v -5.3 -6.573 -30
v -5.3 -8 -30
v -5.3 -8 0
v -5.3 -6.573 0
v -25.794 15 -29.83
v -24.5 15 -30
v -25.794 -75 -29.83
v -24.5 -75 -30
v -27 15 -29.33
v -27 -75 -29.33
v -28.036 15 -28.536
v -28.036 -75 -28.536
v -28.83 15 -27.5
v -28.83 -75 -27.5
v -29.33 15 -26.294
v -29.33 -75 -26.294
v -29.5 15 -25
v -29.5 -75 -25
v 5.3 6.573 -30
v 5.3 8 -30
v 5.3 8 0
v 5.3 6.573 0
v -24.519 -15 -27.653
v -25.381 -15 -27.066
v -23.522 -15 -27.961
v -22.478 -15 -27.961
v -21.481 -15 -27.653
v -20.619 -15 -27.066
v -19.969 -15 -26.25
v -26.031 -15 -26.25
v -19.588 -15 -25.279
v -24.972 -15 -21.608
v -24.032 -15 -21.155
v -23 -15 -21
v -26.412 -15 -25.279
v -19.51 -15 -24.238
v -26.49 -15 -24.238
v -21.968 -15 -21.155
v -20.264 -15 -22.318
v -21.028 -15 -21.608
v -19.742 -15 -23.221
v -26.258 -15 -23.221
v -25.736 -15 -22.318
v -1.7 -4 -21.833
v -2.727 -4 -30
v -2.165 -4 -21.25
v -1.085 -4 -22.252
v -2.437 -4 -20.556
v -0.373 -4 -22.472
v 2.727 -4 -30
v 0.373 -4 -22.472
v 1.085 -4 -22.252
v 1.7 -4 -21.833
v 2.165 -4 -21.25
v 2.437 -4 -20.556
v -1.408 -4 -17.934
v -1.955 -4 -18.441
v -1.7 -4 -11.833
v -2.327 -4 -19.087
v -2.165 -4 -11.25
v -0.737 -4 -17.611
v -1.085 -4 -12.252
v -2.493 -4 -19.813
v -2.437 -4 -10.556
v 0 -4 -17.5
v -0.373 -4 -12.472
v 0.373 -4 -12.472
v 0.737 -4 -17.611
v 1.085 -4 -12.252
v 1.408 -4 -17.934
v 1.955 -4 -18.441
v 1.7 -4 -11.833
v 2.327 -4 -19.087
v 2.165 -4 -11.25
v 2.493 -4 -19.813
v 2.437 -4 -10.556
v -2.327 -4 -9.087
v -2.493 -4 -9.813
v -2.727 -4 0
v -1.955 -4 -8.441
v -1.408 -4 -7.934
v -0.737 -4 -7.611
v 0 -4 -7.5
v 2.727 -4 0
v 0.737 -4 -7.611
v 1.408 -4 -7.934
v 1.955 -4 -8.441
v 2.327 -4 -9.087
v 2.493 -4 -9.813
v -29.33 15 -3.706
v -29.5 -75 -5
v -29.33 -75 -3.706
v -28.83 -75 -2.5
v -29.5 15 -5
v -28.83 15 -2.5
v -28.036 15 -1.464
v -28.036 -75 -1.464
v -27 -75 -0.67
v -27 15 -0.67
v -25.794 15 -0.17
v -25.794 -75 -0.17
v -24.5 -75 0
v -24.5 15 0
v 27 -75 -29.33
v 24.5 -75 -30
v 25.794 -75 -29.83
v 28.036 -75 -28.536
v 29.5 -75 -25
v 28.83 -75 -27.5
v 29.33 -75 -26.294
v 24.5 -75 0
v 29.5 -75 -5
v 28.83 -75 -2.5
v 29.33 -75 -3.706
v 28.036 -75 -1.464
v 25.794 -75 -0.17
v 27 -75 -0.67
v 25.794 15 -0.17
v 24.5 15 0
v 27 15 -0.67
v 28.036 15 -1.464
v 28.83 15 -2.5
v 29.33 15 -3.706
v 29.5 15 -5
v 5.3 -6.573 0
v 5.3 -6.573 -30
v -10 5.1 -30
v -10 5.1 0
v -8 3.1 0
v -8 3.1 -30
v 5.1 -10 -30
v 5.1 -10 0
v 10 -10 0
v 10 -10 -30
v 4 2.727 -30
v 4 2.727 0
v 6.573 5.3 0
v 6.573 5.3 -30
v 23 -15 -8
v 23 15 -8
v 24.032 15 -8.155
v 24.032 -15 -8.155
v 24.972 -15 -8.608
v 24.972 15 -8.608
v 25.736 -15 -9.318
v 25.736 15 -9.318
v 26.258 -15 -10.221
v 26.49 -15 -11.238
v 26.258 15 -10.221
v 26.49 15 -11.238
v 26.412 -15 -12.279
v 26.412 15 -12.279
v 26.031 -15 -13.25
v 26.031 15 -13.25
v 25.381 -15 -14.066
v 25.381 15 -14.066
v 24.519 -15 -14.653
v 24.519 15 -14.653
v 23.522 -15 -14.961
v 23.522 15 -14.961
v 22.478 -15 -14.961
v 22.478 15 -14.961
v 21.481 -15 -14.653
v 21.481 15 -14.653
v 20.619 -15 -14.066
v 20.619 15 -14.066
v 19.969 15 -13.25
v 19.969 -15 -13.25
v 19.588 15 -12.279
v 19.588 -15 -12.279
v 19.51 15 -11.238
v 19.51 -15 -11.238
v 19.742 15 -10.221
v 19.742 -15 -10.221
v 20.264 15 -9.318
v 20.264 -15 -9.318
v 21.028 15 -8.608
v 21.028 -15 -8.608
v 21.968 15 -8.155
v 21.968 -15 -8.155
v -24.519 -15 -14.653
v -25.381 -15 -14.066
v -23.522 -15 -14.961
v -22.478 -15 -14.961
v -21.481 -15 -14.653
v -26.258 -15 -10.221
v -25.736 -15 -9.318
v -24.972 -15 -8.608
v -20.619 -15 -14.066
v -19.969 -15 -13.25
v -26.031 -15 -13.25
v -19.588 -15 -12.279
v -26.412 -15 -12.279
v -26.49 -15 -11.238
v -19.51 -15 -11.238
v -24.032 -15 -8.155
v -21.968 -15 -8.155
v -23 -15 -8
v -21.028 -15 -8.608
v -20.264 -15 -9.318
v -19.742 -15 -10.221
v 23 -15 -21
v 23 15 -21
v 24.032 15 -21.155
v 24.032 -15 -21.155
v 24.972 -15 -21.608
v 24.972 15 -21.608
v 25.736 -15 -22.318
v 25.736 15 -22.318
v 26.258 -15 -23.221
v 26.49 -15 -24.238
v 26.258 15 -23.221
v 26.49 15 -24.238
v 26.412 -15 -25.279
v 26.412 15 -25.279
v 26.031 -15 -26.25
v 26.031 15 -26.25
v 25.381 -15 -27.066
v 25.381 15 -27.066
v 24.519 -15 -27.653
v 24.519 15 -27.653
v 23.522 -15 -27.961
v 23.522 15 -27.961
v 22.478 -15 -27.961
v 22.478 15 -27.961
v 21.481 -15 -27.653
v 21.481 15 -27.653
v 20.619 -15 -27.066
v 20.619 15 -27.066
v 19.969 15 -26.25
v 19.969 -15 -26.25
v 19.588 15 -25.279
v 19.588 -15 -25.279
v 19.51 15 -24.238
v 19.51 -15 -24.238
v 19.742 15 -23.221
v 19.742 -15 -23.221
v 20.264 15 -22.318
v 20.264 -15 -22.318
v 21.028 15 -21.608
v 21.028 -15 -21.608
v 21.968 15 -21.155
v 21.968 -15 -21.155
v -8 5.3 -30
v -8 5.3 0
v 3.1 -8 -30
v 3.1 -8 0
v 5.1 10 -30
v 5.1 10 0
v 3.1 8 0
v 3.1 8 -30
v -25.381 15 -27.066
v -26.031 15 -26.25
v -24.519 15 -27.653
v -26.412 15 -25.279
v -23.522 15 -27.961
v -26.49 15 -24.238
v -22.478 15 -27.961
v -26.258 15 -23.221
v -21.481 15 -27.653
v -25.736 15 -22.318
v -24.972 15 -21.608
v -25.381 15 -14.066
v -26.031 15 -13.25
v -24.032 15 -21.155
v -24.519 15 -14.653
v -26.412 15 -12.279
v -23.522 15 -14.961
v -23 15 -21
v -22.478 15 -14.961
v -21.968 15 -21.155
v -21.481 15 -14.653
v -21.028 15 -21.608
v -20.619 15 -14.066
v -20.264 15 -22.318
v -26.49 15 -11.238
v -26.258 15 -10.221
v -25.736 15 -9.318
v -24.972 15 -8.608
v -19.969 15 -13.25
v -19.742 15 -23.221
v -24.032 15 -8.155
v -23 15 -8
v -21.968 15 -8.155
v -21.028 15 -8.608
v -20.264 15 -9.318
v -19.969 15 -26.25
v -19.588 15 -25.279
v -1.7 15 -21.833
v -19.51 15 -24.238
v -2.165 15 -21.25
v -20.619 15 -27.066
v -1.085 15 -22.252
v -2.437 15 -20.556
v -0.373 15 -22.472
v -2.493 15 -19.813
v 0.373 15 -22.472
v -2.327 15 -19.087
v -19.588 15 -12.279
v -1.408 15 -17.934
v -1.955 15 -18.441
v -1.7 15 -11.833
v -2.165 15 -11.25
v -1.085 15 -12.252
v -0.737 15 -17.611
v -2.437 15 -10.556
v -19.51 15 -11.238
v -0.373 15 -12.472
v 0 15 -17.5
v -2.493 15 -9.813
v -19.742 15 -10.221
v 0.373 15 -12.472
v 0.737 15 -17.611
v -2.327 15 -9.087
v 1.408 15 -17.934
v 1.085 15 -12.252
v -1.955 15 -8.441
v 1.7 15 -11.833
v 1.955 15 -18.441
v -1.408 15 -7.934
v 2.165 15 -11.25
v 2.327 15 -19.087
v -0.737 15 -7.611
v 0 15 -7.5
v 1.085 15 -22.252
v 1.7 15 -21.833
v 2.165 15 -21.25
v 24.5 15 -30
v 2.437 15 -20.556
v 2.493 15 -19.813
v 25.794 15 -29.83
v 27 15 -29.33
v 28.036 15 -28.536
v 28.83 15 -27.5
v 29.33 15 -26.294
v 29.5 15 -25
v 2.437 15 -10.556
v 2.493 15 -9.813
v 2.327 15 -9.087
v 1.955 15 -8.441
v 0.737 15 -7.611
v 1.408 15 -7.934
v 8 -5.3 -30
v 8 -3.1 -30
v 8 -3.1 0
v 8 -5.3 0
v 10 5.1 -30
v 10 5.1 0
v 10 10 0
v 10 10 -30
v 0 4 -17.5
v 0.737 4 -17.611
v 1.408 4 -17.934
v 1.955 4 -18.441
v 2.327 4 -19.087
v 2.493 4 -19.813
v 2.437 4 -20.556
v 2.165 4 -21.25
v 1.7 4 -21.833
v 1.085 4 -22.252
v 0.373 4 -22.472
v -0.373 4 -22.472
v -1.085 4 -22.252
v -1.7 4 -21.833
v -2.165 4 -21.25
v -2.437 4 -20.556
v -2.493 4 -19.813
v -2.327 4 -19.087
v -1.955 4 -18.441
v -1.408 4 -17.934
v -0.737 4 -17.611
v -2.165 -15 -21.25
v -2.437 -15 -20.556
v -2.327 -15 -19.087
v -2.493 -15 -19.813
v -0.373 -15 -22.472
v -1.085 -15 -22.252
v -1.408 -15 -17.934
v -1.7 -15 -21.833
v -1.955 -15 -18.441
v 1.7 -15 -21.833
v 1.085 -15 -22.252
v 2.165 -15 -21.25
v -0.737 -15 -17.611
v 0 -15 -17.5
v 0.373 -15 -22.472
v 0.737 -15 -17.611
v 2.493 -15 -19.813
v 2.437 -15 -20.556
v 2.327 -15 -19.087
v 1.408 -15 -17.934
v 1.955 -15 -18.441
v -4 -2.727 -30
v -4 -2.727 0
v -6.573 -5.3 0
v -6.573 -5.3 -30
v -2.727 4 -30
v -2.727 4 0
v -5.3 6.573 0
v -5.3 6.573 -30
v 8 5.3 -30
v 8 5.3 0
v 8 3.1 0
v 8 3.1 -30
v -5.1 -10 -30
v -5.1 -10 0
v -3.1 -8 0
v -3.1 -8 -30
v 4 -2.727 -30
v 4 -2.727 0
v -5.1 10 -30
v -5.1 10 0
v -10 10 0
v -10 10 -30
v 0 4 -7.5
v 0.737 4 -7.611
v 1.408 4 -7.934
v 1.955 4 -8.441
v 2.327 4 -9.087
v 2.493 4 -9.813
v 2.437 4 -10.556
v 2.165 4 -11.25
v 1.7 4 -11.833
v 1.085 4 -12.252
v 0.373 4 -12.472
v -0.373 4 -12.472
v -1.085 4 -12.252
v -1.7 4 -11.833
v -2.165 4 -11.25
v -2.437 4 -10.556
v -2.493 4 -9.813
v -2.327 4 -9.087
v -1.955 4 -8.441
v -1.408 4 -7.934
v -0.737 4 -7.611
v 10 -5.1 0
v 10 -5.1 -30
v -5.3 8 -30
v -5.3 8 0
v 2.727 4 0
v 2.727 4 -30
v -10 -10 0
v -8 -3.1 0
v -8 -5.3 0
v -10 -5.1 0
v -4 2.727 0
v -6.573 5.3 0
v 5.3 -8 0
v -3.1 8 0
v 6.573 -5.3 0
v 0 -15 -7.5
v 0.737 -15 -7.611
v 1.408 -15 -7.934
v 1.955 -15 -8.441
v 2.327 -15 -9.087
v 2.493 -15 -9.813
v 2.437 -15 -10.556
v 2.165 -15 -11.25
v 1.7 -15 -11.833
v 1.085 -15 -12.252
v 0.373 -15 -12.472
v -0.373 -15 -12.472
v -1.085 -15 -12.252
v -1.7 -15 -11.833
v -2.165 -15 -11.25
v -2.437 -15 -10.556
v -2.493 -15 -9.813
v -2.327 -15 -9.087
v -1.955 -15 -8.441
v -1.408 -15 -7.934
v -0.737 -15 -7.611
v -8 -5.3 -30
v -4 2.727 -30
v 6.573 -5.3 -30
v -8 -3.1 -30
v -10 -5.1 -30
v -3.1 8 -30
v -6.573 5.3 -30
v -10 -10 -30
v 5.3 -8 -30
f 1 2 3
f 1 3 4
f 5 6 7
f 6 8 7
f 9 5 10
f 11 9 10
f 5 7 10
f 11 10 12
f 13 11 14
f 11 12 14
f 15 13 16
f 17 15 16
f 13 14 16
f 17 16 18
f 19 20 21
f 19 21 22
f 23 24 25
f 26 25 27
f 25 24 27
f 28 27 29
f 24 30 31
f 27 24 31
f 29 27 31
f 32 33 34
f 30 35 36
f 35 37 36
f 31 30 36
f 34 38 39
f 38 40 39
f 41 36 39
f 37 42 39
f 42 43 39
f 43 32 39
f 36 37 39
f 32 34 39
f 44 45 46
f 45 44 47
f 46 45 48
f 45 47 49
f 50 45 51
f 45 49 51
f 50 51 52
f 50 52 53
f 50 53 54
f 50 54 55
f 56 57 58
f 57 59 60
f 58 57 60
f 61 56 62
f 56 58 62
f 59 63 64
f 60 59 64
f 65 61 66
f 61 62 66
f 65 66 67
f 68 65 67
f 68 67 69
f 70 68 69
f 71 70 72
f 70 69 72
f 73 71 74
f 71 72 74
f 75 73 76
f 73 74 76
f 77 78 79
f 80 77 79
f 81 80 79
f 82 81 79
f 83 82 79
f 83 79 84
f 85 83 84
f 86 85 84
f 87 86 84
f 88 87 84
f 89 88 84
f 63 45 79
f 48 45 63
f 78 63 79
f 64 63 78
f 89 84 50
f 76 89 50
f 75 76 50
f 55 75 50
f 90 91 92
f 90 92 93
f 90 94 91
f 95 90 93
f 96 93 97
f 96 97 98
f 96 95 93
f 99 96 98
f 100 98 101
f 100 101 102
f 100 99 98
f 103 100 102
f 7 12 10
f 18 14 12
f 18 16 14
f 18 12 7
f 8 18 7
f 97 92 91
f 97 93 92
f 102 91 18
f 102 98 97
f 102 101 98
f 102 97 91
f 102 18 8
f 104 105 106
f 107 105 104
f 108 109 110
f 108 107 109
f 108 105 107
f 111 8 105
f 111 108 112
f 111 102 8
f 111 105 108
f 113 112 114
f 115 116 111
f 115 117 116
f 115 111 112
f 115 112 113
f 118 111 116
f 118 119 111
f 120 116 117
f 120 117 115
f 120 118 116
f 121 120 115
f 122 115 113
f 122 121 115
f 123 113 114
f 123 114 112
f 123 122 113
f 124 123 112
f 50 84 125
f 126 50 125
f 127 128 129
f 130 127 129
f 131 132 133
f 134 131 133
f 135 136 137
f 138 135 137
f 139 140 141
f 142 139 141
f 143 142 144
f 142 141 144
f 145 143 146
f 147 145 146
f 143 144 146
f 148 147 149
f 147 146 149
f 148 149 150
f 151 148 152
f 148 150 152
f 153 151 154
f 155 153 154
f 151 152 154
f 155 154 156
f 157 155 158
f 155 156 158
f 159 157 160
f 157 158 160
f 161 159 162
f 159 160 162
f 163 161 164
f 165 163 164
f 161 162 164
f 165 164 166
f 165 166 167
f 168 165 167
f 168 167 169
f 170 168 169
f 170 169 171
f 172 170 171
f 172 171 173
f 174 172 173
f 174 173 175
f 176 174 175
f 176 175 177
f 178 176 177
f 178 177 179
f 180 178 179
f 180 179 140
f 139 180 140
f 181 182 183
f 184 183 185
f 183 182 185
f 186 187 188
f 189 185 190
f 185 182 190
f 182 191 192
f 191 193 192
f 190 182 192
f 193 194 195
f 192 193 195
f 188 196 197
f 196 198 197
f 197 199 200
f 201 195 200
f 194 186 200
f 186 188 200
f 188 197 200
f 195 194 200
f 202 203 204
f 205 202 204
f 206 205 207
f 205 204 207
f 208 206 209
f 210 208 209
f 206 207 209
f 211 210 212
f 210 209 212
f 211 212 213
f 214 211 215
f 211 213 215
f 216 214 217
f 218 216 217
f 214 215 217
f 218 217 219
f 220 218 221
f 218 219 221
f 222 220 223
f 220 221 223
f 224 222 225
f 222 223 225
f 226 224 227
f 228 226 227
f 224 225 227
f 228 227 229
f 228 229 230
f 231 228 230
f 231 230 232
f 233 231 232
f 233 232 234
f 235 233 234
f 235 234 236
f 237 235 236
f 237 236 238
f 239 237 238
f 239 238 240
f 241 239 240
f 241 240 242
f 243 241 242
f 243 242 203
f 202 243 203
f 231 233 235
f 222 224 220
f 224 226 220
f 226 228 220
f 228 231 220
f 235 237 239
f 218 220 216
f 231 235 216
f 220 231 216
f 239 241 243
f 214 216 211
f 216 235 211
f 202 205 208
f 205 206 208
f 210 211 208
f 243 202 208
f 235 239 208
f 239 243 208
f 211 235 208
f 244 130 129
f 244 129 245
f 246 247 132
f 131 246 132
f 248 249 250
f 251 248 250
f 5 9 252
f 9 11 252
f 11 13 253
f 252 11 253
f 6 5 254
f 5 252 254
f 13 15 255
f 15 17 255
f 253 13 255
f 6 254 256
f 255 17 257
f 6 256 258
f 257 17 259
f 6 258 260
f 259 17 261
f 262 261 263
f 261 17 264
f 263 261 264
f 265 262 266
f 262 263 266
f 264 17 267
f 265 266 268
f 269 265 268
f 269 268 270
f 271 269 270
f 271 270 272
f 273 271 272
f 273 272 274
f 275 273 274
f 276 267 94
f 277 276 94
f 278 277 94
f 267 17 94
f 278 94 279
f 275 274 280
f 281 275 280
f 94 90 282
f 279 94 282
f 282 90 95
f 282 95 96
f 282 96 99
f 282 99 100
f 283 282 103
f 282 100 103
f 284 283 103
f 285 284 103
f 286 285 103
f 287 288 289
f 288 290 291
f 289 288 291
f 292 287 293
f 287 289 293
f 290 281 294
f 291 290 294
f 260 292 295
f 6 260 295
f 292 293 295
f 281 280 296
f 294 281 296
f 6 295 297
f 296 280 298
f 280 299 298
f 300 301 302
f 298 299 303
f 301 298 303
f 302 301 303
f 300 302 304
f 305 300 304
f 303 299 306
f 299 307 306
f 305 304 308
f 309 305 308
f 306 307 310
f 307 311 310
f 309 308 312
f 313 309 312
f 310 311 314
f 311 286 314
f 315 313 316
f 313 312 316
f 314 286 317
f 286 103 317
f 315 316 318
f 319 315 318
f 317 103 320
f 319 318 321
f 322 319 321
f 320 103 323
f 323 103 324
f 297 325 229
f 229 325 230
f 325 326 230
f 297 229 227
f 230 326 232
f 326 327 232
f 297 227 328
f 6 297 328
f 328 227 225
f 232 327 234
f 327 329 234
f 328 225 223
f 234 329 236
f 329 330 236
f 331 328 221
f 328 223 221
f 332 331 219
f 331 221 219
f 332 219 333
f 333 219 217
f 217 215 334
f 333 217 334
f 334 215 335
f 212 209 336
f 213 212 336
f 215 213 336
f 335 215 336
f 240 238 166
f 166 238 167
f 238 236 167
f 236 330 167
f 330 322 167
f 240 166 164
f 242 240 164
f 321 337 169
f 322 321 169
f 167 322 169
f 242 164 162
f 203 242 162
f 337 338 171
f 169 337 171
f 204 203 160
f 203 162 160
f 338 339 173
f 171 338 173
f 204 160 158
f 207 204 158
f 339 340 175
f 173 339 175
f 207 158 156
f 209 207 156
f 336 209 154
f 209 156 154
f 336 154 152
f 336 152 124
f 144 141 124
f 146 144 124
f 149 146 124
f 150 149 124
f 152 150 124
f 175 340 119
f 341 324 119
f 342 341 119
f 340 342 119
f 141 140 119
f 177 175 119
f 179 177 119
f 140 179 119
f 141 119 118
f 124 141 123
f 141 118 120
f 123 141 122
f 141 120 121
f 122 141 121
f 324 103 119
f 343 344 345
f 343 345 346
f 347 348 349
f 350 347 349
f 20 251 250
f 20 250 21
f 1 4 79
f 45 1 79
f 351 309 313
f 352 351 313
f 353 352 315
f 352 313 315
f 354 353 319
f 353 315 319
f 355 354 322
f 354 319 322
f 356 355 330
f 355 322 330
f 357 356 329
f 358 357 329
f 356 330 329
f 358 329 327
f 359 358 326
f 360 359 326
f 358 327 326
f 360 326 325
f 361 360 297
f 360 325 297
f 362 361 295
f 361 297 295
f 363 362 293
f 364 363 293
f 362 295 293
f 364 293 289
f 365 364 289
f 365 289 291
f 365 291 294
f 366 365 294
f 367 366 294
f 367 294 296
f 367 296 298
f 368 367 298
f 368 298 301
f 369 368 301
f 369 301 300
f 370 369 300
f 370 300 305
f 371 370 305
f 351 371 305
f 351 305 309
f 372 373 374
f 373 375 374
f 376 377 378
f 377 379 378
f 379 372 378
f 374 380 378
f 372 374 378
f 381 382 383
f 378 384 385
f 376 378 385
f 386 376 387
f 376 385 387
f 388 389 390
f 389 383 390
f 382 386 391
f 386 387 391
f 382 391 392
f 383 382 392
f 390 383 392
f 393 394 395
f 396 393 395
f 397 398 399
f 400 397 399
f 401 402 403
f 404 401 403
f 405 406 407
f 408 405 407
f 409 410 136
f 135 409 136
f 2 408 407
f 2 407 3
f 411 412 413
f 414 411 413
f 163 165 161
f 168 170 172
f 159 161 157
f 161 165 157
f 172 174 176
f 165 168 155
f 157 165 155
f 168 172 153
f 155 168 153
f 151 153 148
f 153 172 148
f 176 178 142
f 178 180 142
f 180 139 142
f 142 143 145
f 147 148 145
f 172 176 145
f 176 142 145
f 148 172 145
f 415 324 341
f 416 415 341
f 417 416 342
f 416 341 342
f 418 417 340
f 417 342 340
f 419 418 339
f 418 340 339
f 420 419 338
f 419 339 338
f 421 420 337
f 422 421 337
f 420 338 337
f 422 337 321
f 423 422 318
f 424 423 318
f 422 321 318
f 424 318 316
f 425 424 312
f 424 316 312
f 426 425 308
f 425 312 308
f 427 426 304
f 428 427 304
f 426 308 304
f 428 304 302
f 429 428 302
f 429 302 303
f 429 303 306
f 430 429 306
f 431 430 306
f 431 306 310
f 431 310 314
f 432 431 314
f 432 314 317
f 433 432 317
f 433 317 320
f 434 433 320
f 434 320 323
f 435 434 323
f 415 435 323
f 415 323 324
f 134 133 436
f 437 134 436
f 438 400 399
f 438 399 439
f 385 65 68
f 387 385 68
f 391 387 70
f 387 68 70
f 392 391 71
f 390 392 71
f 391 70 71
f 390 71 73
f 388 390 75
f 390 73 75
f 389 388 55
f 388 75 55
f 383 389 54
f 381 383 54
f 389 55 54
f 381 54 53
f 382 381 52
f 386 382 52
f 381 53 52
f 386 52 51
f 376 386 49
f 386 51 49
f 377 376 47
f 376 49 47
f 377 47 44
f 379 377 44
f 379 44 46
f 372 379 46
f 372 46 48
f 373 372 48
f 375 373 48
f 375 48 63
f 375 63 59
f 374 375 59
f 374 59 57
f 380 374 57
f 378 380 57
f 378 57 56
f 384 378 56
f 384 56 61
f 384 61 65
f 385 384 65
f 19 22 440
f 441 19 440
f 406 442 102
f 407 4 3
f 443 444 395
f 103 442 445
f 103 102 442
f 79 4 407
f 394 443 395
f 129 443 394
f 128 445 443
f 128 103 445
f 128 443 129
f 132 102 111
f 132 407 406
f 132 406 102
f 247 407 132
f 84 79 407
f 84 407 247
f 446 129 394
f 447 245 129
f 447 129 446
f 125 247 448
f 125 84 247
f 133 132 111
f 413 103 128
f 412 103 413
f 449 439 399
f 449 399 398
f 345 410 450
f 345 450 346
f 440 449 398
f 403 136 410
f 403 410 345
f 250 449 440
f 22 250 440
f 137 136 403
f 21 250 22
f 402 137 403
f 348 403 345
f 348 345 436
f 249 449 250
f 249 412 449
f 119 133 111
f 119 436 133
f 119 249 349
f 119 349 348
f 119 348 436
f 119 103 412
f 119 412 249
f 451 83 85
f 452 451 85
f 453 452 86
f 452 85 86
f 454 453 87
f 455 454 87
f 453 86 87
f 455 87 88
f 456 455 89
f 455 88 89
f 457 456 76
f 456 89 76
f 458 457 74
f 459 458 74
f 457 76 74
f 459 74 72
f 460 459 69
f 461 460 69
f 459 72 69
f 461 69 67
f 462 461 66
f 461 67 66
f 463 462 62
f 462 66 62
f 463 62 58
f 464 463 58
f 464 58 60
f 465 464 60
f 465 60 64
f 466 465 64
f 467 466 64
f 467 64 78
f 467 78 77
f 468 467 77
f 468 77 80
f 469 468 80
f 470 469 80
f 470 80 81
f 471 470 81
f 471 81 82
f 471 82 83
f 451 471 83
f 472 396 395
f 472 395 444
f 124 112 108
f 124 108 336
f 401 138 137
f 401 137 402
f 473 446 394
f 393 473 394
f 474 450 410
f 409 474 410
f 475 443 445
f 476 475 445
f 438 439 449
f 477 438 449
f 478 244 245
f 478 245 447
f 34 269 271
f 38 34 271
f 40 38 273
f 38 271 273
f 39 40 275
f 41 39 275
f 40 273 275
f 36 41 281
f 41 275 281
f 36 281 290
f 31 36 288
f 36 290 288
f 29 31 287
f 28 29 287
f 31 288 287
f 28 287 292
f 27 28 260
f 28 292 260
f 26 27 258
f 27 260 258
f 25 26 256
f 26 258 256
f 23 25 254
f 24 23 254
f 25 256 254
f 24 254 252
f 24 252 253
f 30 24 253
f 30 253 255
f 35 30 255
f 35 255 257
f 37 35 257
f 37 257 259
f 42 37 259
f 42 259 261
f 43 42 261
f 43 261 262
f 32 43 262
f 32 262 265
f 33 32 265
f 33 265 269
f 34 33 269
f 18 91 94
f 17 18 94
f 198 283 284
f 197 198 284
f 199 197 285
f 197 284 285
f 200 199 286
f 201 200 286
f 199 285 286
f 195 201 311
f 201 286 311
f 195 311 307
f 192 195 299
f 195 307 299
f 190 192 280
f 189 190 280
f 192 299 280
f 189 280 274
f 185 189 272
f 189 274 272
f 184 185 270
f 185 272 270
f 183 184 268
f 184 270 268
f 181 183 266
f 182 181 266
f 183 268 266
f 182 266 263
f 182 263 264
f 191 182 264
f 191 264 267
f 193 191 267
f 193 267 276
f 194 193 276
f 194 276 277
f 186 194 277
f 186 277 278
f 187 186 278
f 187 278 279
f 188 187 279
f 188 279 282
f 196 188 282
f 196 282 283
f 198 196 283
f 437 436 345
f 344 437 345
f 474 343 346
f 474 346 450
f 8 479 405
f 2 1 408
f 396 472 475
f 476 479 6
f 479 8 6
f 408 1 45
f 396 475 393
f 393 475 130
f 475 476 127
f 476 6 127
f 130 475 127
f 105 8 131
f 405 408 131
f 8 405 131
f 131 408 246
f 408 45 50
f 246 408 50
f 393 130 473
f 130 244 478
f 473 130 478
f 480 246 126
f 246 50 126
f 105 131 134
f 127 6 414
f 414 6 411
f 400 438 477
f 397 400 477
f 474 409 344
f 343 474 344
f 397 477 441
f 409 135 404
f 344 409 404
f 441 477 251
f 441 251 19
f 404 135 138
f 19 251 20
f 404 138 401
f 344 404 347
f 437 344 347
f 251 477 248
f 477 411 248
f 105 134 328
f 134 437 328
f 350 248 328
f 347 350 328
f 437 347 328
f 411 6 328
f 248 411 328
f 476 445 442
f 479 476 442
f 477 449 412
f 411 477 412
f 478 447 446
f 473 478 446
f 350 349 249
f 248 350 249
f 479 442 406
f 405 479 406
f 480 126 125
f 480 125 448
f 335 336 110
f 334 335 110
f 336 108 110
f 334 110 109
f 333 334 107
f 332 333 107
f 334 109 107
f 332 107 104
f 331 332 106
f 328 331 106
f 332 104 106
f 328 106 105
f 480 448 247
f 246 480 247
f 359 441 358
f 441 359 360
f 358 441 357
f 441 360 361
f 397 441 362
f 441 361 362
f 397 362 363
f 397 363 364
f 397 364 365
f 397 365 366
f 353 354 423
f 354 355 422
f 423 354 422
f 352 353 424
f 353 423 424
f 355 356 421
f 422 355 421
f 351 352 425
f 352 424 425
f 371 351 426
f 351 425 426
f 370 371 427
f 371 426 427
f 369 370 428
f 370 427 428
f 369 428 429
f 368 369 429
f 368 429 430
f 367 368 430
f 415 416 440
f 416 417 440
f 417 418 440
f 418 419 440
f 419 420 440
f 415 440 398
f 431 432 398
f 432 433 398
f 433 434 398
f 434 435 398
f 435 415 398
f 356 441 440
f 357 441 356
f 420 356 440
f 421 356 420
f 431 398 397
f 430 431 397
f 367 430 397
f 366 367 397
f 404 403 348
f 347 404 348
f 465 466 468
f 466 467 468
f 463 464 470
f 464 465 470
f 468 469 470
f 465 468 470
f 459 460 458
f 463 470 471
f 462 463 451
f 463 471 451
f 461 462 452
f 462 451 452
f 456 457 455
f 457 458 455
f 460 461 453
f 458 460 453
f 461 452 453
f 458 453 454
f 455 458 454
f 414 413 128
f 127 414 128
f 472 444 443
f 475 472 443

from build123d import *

# Parameters (mm, degrees)
SKETCH1_W           = 59
SKETCH1_H           = 30
BOSS_EXTRUDE1_DEPTH = 30
SKETCH2_R           = 2.5
SKETCH2_R_2         = 3.5
CUT_EXTRUDE1_DEPTH  = 52.674461778
SKETCH3_W           = 59
SKETCH3_H           = 60
BOSS_EXTRUDE2_DEPTH = 30
FILLET1_R           = 5
FILLET2_R           = 5
FILLET3_R           = 5
FILLET4_R           = 5


with BuildPart() as part:
    # Sketch1 → Boss-Extrude1 (new body)
    with BuildSketch(Plane.XY):
        Rectangle(SKETCH1_W, SKETCH1_H)
        Polygon((4, 2.727207794), (6.572792206, 5.3), (8, 5.3), (8, 3.1), (10, 5.1), (10, 10), (5.1, 10), (3.1, 8), (5.3, 8), (5.3, 6.572792206), (2.727207794, 4), (-2.727207794, 4), (-5.3, 6.572792206), (-5.3, 8), (-3.1, 8), (-5.1, 10), (-10, 10), (-10, 5.1), (-8, 3.1), (-8, 5.3), (-6.572792206, 5.3), (-4, 2.727207794), (-4, -2.727207794), (-6.572792206, -5.3), (-8, -5.3), (-8, -3.1), (-10, -5.1), (-10, -10), (-5.1, -10), (-3.1, -8), (-5.3, -8), (-5.3, -6.572792206), (-2.727207794, -4), (2.727207794, -4), (5.3, -6.572792206), (5.3, -8), (3.1, -8), (5.1, -10), (10, -10), (10, -5.1), (8, -3.1), (8, -5.3), (6.572792206, -5.3), (4, -2.727207794), align=None, mode=Mode.SUBTRACT)
    extrude(amount=-BOSS_EXTRUDE1_DEPTH)

    # Sketch2 → Cut-Extrude1 (cut, through all)
    with BuildSketch(Plane(origin=(0, 15, 0), x_dir=(1, 0, 0), z_dir=(0, 1, 0))):
        with Locations(Location((0, 10, 0), (0, 0, 270))):
            Circle(SKETCH2_R)
        with Locations(Location((0, 20, 0), (0, 0, 270))):
            Circle(SKETCH2_R)
        with Locations(Location((-23, 24.5, 0), (0, 0, 270))):
            Circle(SKETCH2_R_2)
        with Locations(Location((23, 24.5, 0), (0, 0, 270))):
            Circle(SKETCH2_R_2)
        with Locations(Location((23, 11.5, 0), (0, 0, 270))):
            Circle(SKETCH2_R_2)
        with Locations(Location((-23, 11.5, 0), (0, 0, 270))):
            Circle(SKETCH2_R_2)
    extrude(amount=-CUT_EXTRUDE1_DEPTH, mode=Mode.SUBTRACT)

    # Sketch3 → Boss-Extrude2 (add)
    with BuildSketch(Plane.XY):
        with Locations((0, -45)):
            Rectangle(SKETCH3_W, SKETCH3_H)
    extrude(amount=-BOSS_EXTRUDE2_DEPTH)

    # Fillet1
    fillet1_edges = [part.edges().sort_by_distance(p)[0] for p in [
        (29.5, -30, 0),
    ]]
    fillet(fillet1_edges, radius=FILLET1_R)

    # Fillet2
    fillet2_edges = [part.edges().sort_by_distance(p)[0] for p in [
        (29.5, -30, -30),
    ]]
    fillet(fillet2_edges, radius=FILLET2_R)

    # Fillet3
    fillet3_edges = [part.edges().sort_by_distance(p)[0] for p in [
        (-29.5, -30, -30),
    ]]
    fillet(fillet3_edges, radius=FILLET3_R)

    # Fillet4
    fillet4_edges = [part.edges().sort_by_distance(p)[0] for p in [
        (-29.5, -30, 0),
    ]]
    fillet(fillet4_edges, radius=FILLET4_R)


solid = part.part
